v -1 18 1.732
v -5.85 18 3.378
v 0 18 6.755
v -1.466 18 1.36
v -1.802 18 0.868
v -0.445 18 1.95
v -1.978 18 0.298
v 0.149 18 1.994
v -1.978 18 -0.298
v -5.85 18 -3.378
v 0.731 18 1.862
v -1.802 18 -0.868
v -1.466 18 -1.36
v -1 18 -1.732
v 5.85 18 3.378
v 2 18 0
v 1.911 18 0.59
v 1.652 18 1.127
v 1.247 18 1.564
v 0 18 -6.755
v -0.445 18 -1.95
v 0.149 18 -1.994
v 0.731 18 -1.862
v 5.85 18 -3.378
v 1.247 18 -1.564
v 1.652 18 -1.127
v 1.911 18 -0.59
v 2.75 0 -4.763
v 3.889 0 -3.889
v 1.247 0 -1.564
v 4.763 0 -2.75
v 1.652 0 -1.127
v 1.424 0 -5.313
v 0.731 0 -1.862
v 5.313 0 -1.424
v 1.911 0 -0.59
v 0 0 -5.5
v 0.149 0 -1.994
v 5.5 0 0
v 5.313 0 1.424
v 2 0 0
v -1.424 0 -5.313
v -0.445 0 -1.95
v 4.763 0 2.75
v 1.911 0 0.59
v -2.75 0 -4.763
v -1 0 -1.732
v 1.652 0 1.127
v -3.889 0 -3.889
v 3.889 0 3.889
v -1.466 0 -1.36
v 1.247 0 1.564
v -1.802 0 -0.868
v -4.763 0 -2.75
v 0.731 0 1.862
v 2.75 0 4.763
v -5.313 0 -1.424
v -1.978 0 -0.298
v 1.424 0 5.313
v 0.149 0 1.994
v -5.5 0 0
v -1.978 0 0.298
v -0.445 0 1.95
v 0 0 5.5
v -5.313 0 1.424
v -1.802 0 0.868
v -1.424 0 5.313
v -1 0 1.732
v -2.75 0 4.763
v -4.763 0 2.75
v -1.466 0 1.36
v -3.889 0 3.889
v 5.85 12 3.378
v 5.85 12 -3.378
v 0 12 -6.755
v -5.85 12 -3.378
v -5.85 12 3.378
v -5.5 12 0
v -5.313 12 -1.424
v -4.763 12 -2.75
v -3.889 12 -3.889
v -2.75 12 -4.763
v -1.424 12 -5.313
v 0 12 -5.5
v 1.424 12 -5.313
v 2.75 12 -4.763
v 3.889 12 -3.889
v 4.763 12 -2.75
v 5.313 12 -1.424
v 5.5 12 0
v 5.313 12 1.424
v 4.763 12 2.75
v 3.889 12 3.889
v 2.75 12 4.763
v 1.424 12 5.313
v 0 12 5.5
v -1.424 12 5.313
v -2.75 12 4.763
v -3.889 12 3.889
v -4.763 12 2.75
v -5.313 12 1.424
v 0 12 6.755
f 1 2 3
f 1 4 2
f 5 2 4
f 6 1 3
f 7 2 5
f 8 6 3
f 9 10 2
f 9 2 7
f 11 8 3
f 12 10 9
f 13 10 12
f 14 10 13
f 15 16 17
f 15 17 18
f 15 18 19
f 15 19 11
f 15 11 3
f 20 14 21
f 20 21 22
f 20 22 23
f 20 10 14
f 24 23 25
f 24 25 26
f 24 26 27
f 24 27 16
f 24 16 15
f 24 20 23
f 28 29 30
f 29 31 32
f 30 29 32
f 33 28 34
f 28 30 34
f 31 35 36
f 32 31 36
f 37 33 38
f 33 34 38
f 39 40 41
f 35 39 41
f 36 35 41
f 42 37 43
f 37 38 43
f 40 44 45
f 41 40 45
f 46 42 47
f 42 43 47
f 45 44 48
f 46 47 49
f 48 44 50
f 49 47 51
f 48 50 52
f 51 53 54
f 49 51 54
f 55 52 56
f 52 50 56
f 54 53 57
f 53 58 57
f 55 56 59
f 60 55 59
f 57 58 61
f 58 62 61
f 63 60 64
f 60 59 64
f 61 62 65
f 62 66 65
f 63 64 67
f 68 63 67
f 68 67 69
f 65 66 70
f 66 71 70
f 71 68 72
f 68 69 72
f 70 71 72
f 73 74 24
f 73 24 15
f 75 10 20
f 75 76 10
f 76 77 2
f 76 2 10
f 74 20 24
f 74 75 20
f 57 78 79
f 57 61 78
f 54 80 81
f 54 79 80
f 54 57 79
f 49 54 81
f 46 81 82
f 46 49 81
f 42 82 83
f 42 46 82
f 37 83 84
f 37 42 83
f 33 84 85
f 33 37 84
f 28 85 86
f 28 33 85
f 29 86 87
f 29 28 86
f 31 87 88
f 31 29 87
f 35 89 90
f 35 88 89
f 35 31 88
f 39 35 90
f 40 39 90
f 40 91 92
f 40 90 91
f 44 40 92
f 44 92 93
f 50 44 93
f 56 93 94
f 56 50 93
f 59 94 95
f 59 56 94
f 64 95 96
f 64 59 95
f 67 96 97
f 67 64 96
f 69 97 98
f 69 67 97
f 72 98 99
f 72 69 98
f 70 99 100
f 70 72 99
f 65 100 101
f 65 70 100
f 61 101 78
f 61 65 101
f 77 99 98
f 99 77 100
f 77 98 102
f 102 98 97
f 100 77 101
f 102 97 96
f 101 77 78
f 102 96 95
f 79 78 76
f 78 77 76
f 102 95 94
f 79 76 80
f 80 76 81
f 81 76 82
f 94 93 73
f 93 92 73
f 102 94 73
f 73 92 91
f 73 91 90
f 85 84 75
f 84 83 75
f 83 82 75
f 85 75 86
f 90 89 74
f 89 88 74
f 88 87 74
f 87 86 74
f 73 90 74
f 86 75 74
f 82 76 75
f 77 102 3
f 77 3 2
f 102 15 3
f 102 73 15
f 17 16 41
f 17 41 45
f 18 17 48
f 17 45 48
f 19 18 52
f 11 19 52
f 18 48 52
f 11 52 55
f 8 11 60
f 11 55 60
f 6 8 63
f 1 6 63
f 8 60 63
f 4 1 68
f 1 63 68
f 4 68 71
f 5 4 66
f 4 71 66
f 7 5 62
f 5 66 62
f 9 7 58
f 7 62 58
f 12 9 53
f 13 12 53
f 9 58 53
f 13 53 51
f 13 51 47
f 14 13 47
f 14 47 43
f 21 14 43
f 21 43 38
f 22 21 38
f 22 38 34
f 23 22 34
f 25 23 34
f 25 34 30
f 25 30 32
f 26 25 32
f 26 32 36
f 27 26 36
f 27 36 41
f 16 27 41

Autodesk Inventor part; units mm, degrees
ref_plane "XZ Plane" through (0, 0, 0) normal (0, 1, 0) x (-1, 0, 0)
ref_plane "XY Plane" through (0, 0, 0) normal (0, 0, 1) x (1, 0, 0)
sketch "草圖1" plane through (0, 0, 0) normal (0, 1, 0) x (-1, 0, 0)
  circle A0 centre (0, 0) radius 5.5
  dimension "d0" = 11
extrude "擠出1" add sketch "草圖1" along normal blind 12
sketch "草圖2" plane through (0, 12, 0) normal (0, 1, 0) x (1, 0, 0)
  line L0 (5.85, -3.3775) -> (0, -6.755)
  line L1 (0, -6.755) -> (-5.85, -3.3775)
  line L2 (-5.85, -3.3775) -> (-5.85, 3.3775)
  line L3 (-5.85, 3.3775) -> (0, 6.755)
  line L4 (0, 6.755) -> (5.85, 3.3775)
  line L5 (5.85, 3.3775) -> (5.85, -3.3775)
  point P0 (0, 0)
  point P1 (0, 0)
  dimension "d3" = 11.7
extrude "擠出2" add sketch "草圖2" along normal blind 6
sketch "草圖3" plane through (0, 0, 0) normal (0, -1, 0) x (1, 0, 0)
  circle A0 centre (0, 0) radius 2
  dimension "d6" = 4
extrude "擠出3" cut sketch "草圖3" against normal up to surface (18 mm away)
sketch "草圖6" plane through (0, 0, 0) normal (0, -1, 0) x (1, 0, 0)
  circle A0 centre (0, 0) radius 2 projected
  circle A1 centre (0, 0) radius 5.5 projected
  circle A2 centre (0, 0) radius 2 projected
  line L0 (1.0536, 1.7) -> (-1.0536, 1.7)
  dimension "d15" = 1.7
ref_plane "工作平面2" through (-5.5, 0, 0) normal (1, 0, 0) x (0, 1, 0)
ref_plane "工作平面1" through (5.5, 0, 0) normal (1, 0, 0) x (0, 1, 0)
sketch "草圖8" plane through (0, 0, 0) normal (0, -1, 0) x (1, 0, 0)
  arc A0 (-0.7518, 6.0636) -> (-1.1588, 5.9991) centre (0, 0) ccw
  arc A1 (-1.1588, 5.9991) -> (-1.2788, 5.8304) centre (-1.1303, 5.8518) ccw
  arc A2 (-1.2782, 5.5484) -> (-1.2788, 5.8304) centre (-2.2685, 5.6874) ccw
  arc A3 (-2.2271, 5.24) -> (-1.2782, 5.5484) centre (-1.8278, 5.6255) ccw
  arc A4 (-2.3924, 5.4685) -> (-2.2271, 5.24) centre (-1.5077, 5.9346) ccw
  arc A5 (-2.3924, 5.4685) -> (-2.5887, 5.5345) centre (-2.5252, 5.3986) ccw
  arc A6 (-2.5887, 5.5345) -> (-2.9559, 5.3474) centre (0, 0) ccw
  arc A7 (-2.9559, 5.3474) -> (-3.0179, 5.1498) centre (-2.8833, 5.2161) ccw
  arc A8 (-2.9302, 4.8818) -> (-3.0179, 5.1498) centre (-3.915, 4.708) ccw
  arc A9 (-3.7374, 4.2953) -> (-2.9302, 4.8818) centre (-3.4767, 4.7853) ccw
  arc A10 (-3.9652, 4.4616) -> (-3.7374, 4.2953) centre (-3.2678, 5.1782) ccw
  arc A11 (-3.9652, 4.4616) -> (-4.1723, 4.4637) centre (-4.0698, 4.3541) ccw
  arc A12 (-4.1723, 4.4637) -> (-4.4637, 4.1723) centre (0, 0) ccw
  arc A13 (-4.4637, 4.1723) -> (-4.4616, 3.9652) centre (-4.3541, 4.0698) ccw
  arc A14 (-4.2953, 3.7374) -> (-4.4616, 3.9652) centre (-5.1782, 3.2678) ccw
  arc A15 (-4.8818, 2.9302) -> (-4.2953, 3.7374) centre (-4.7853, 3.4767) ccw
  arc A16 (-5.1498, 3.0179) -> (-4.8818, 2.9302) centre (-4.708, 3.915) ccw
  arc A17 (-5.1498, 3.0179) -> (-5.3474, 2.9559) centre (-5.2161, 2.8833) ccw
  arc A18 (-5.3474, 2.9559) -> (-5.5345, 2.5887) centre (0, 0) ccw
  arc A19 (-5.5345, 2.5887) -> (-5.4685, 2.3924) centre (-5.3986, 2.5252) ccw
  arc A20 (-5.24, 2.2271) -> (-5.4685, 2.3924) centre (-5.9346, 1.5077) ccw
  arc A21 (-5.5484, 1.2782) -> (-5.24, 2.2271) centre (-5.6255, 1.8278) ccw
  arc A22 (-5.8304, 1.2788) -> (-5.5484, 1.2782) centre (-5.6874, 2.2685) ccw
  arc A23 (-5.8304, 1.2788) -> (-5.9991, 1.1588) centre (-5.8518, 1.1303) ccw
  arc A24 (-5.9991, 1.1588) -> (-6.0636, 0.7518) centre (0, 0) ccw
  arc A25 (-6.0636, 0.7518) -> (-5.9402, 0.5855) centre (-5.9147, 0.7333) ccw
  arc A26 (-5.6718, 0.4989) -> (-5.9402, 0.5855) centre (-6.11, -0.4) ccw
  arc A27 (-5.6718, -0.4989) -> (-5.6718, 0.4989) centre (-5.915, 0) ccw
  arc A28 (-5.9402, -0.5855) -> (-5.6718, -0.4989) centre (-6.11, 0.4) ccw
  arc A29 (-5.9402, -0.5855) -> (-6.0636, -0.7518) centre (-5.9147, -0.7333) ccw
  arc A30 (-6.0636, -0.7518) -> (-5.9991, -1.1588) centre (0, 0) ccw
  arc A31 (-5.9991, -1.1588) -> (-5.8304, -1.2788) centre (-5.8518, -1.1303) ccw
  arc A32 (-5.5484, -1.2782) -> (-5.8304, -1.2788) centre (-5.6874, -2.2685) ccw
  arc A33 (-5.24, -2.2271) -> (-5.5484, -1.2782) centre (-5.6255, -1.8278) ccw
  arc A34 (-5.4685, -2.3924) -> (-5.24, -2.2271) centre (-5.9346, -1.5077) ccw
  arc A35 (-5.4685, -2.3924) -> (-5.5345, -2.5887) centre (-5.3986, -2.5252) ccw
  arc A36 (-5.5345, -2.5887) -> (-5.3474, -2.9559) centre (0, 0) ccw
  arc A37 (-5.3474, -2.9559) -> (-5.1498, -3.0179) centre (-5.2161, -2.8833) ccw
  arc A38 (-4.8818, -2.9302) -> (-5.1498, -3.0179) centre (-4.708, -3.915) ccw
  arc A39 (-4.2953, -3.7374) -> (-4.8818, -2.9302) centre (-4.7853, -3.4767) ccw
  arc A40 (-4.4616, -3.9652) -> (-4.2953, -3.7374) centre (-5.1782, -3.2678) ccw
  arc A41 (-4.4616, -3.9652) -> (-4.4637, -4.1723) centre (-4.3541, -4.0698) ccw
  arc A42 (-4.4637, -4.1723) -> (-4.1723, -4.4637) centre (0, 0) ccw
  arc A43 (-4.1723, -4.4637) -> (-3.9652, -4.4616) centre (-4.0698, -4.3541) ccw
  arc A44 (-3.7374, -4.2953) -> (-3.9652, -4.4616) centre (-3.2678, -5.1782) ccw
  arc A45 (-2.9302, -4.8818) -> (-3.7374, -4.2953) centre (-3.4767, -4.7853) ccw
  arc A46 (-3.0179, -5.1498) -> (-2.9302, -4.8818) centre (-3.915, -4.708) ccw
  arc A47 (-3.0179, -5.1498) -> (-2.9559, -5.3474) centre (-2.8833, -5.2161) ccw
  arc A48 (-2.9559, -5.3474) -> (-2.5887, -5.5345) centre (0, 0) ccw
  arc A49 (-2.5887, -5.5345) -> (-2.3924, -5.4685) centre (-2.5252, -5.3986) ccw
  arc A50 (-2.2271, -5.24) -> (-2.3924, -5.4685) centre (-1.5077, -5.9346) ccw
  arc A51 (-1.2782, -5.5484) -> (-2.2271, -5.24) centre (-1.8278, -5.6255) ccw
  arc A52 (-1.2788, -5.8304) -> (-1.2782, -5.5484) centre (-2.2685, -5.6874) ccw
  arc A53 (-1.2788, -5.8304) -> (-1.1588, -5.9991) centre (-1.1303, -5.8518) ccw
  arc A54 (-1.1588, -5.9991) -> (-0.7518, -6.0636) centre (0, 0) ccw
  arc A55 (-0.7518, -6.0636) -> (-0.5855, -5.9402) centre (-0.7333, -5.9147) ccw
  arc A56 (-0.4989, -5.6718) -> (-0.5855, -5.9402) centre (0.4, -6.11) ccw
  arc A57 (0.4989, -5.6718) -> (-0.4989, -5.6718) centre (0, -5.915) ccw
  arc A58 (0.5855, -5.9402) -> (0.4989, -5.6718) centre (-0.4, -6.11) ccw
  arc A59 (0.5855, -5.9402) -> (0.7518, -6.0636) centre (0.7333, -5.9147) ccw
  arc A60 (0.7518, -6.0636) -> (1.1588, -5.9991) centre (0, 0) ccw
  arc A61 (1.1588, -5.9991) -> (1.2788, -5.8304) centre (1.1303, -5.8518) ccw
  arc A62 (1.2782, -5.5484) -> (1.2788, -5.8304) centre (2.2685, -5.6874) ccw
  arc A63 (2.2271, -5.24) -> (1.2782, -5.5484) centre (1.8278, -5.6255) ccw
  arc A64 (2.3924, -5.4685) -> (2.2271, -5.24) centre (1.5077, -5.9346) ccw
  arc A65 (2.3924, -5.4685) -> (2.5887, -5.5345) centre (2.5252, -5.3986) ccw
  arc A66 (2.5887, -5.5345) -> (2.9559, -5.3474) centre (0, 0) ccw
  arc A67 (2.9559, -5.3474) -> (3.0179, -5.1498) centre (2.8833, -5.2161) ccw
  arc A68 (2.9302, -4.8818) -> (3.0179, -5.1498) centre (3.915, -4.708) ccw
  arc A69 (3.7374, -4.2953) -> (2.9302, -4.8818) centre (3.4767, -4.7853) ccw
  arc A70 (3.9652, -4.4616) -> (3.7374, -4.2953) centre (3.2678, -5.1782) ccw
  arc A71 (3.9652, -4.4616) -> (4.1723, -4.4637) centre (4.0698, -4.3541) ccw
  arc A72 (4.1723, -4.4637) -> (4.4637, -4.1723) centre (0, 0) ccw
  arc A73 (4.4637, -4.1723) -> (4.4616, -3.9652) centre (4.3541, -4.0698) ccw
  arc A74 (4.2953, -3.7374) -> (4.4616, -3.9652) centre (5.1782, -3.2678) ccw
  arc A75 (4.8818, -2.9302) -> (4.2953, -3.7374) centre (4.7853, -3.4767) ccw
  arc A76 (5.1498, -3.0179) -> (4.8818, -2.9302) centre (4.708, -3.915) ccw
  arc A77 (5.1498, -3.0179) -> (5.3474, -2.9559) centre (5.2161, -2.8833) ccw
  arc A78 (5.3474, -2.9559) -> (5.5345, -2.5887) centre (0, 0) ccw
  arc A79 (5.5345, -2.5887) -> (5.4685, -2.3924) centre (5.3986, -2.5252) ccw
  arc A80 (5.24, -2.2271) -> (5.4685, -2.3924) centre (5.9346, -1.5077) ccw
  arc A81 (5.5484, -1.2782) -> (5.24, -2.2271) centre (5.6255, -1.8278) ccw
  arc A82 (5.8304, -1.2788) -> (5.5484, -1.2782) centre (5.6874, -2.2685) ccw
  arc A83 (5.8304, -1.2788) -> (5.9991, -1.1588) centre (5.8518, -1.1303) ccw
  arc A84 (5.9991, -1.1588) -> (6.0636, -0.7518) centre (0, 0) ccw
  arc A85 (6.0636, -0.7518) -> (5.9402, -0.5855) centre (5.9147, -0.7333) ccw
  arc A86 (5.6718, -0.4989) -> (5.9402, -0.5855) centre (6.11, 0.4) ccw
  arc A87 (5.6718, 0.4989) -> (5.6718, -0.4989) centre (5.915, 0) ccw
  arc A88 (5.9402, 0.5855) -> (5.6718, 0.4989) centre (6.11, -0.4) ccw
  arc A89 (5.9402, 0.5855) -> (6.0636, 0.7518) centre (5.9147, 0.7333) ccw
  arc A90 (6.0636, 0.7518) -> (5.9991, 1.1588) centre (0, 0) ccw
  arc A91 (5.9991, 1.1588) -> (5.8304, 1.2788) centre (5.8518, 1.1303) ccw
  arc A92 (5.5484, 1.2782) -> (5.8304, 1.2788) centre (5.6874, 2.2685) ccw
  arc A93 (5.24, 2.2271) -> (5.5484, 1.2782) centre (5.6255, 1.8278) ccw
  arc A94 (5.4685, 2.3924) -> (5.24, 2.2271) centre (5.9346, 1.5077) ccw
  arc A95 (5.4685, 2.3924) -> (5.5345, 2.5887) centre (5.3986, 2.5252) ccw
  arc A96 (5.5345, 2.5887) -> (5.3474, 2.9559) centre (0, 0) ccw
  arc A97 (5.3474, 2.9559) -> (5.1498, 3.0179) centre (5.2161, 2.8833) ccw
  arc A98 (4.8818, 2.9302) -> (5.1498, 3.0179) centre (4.708, 3.915) ccw
  arc A99 (4.2953, 3.7374) -> (4.8818, 2.9302) centre (4.7853, 3.4767) ccw
  arc A100 (4.4616, 3.9652) -> (4.2953, 3.7374) centre (5.1782, 3.2678) ccw
  arc A101 (4.4616, 3.9652) -> (4.4637, 4.1723) centre (4.3541, 4.0698) ccw
  arc A102 (4.4637, 4.1723) -> (4.1723, 4.4637) centre (0, 0) ccw
  arc A103 (4.1723, 4.4637) -> (3.9652, 4.4616) centre (4.0698, 4.3541) ccw
  arc A104 (3.7374, 4.2953) -> (3.9652, 4.4616) centre (3.2678, 5.1782) ccw
  arc A105 (2.9302, 4.8818) -> (3.7374, 4.2953) centre (3.4767, 4.7853) ccw
  arc A106 (3.0179, 5.1498) -> (2.9302, 4.8818) centre (3.915, 4.708) ccw
  arc A107 (3.0179, 5.1498) -> (2.9559, 5.3474) centre (2.8833, 5.2161) ccw
  arc A108 (2.9559, 5.3474) -> (2.5887, 5.5345) centre (0, 0) ccw
  arc A109 (2.5887, 5.5345) -> (2.3924, 5.4685) centre (2.5252, 5.3986) ccw
  arc A110 (2.2271, 5.24) -> (2.3924, 5.4685) centre (1.5077, 5.9346) ccw
  arc A111 (1.2782, 5.5484) -> (2.2271, 5.24) centre (1.8278, 5.6255) ccw
  arc A112 (1.2788, 5.8304) -> (1.2782, 5.5484) centre (2.2685, 5.6874) ccw
  arc A113 (1.2788, 5.8304) -> (1.1588, 5.9991) centre (1.1303, 5.8518) ccw
  arc A114 (1.1588, 5.9991) -> (0.7518, 6.0636) centre (0, 0) ccw
  arc A115 (0.7518, 6.0636) -> (0.5855, 5.9402) centre (0.7333, 5.9147) ccw
  arc A116 (0.4989, 5.6718) -> (0.5855, 5.9402) centre (-0.4, 6.11) ccw
  arc A117 (-0.4989, 5.6718) -> (0.4989, 5.6718) centre (0, 5.915) ccw
  arc A118 (-0.5855, 5.9402) -> (-0.4989, 5.6718) centre (0.4, 6.11) ccw
  arc A119 (-0.5855, 5.9402) -> (-0.7518, 6.0636) centre (-0.7333, 5.9147) ccw
extrude "擠出7" [suppressed]
sketch "草圖9" plane through (0, 0, 0) normal (0, 1, 0) x (1, 0, 0)
  point P0 (0, 0)
extrude "擠出8" [suppressed]
sketch "草圖10" plane through (0, 0, 0) normal (0, -1, 0) x (1, 0, 0)
  arc A0 (-5.5, 0) -> (-5.5, 0) centre (0, 0) ccw projected
  arc A1 (-5.5, 0) -> (-5.5, 0) centre (0, 0) ccw projected
  circle A2 centre (0, 0) radius 5.5 projected
  arc A3 (-0.7518, 6.0636) -> (-1.1588, 5.9991) centre (0, 0) ccw projected
  arc A4 (-1.1588, 5.9991) -> (-1.2788, 5.8304) centre (-1.1303, 5.8518) ccw projected
  arc A5 (-1.2782, 5.5484) -> (-1.2788, 5.8304) centre (-2.2685, 5.6874) ccw projected
  arc A6 (-2.2271, 5.24) -> (-1.2782, 5.5484) centre (-1.8278, 5.6255) ccw projected
  arc A7 (-2.3924, 5.4685) -> (-2.2271, 5.24) centre (-1.5077, 5.9346) ccw projected
  arc A8 (-2.3924, 5.4685) -> (-2.5887, 5.5345) centre (-2.5252, 5.3986) ccw projected
  arc A9 (-2.5887, 5.5345) -> (-2.9559, 5.3474) centre (0, 0) ccw projected
  arc A10 (-2.9559, 5.3474) -> (-3.0179, 5.1498) centre (-2.8833, 5.2161) ccw projected
  arc A11 (-2.9302, 4.8818) -> (-3.0179, 5.1498) centre (-3.915, 4.708) ccw projected
  arc A12 (-3.7374, 4.2953) -> (-2.9302, 4.8818) centre (-3.4767, 4.7853) ccw projected
  arc A13 (-3.9652, 4.4616) -> (-3.7374, 4.2953) centre (-3.2678, 5.1782) ccw projected
  arc A14 (-3.9652, 4.4616) -> (-4.1723, 4.4637) centre (-4.0698, 4.3541) ccw projected
  arc A15 (-4.1723, 4.4637) -> (-4.4637, 4.1723) centre (0, 0) ccw projected
  arc A16 (-4.4637, 4.1723) -> (-4.4616, 3.9652) centre (-4.3541, 4.0698) ccw projected
  arc A17 (-4.2953, 3.7374) -> (-4.4616, 3.9652) centre (-5.1782, 3.2678) ccw projected
  arc A18 (-4.8818, 2.9302) -> (-4.2953, 3.7374) centre (-4.7853, 3.4767) ccw projected
  arc A19 (-5.1498, 3.0179) -> (-4.8818, 2.9302) centre (-4.708, 3.915) ccw projected
  arc A20 (-5.1498, 3.0179) -> (-5.3474, 2.9559) centre (-5.2161, 2.8833) ccw projected
  arc A21 (-5.3474, 2.9559) -> (-5.5345, 2.5887) centre (0, 0) ccw projected
  arc A22 (-5.5345, 2.5887) -> (-5.4685, 2.3924) centre (-5.3986, 2.5252) ccw projected
  arc A23 (-5.24, 2.2271) -> (-5.4685, 2.3924) centre (-5.9346, 1.5077) ccw projected
  arc A24 (-5.5484, 1.2782) -> (-5.24, 2.2271) centre (-5.6255, 1.8278) ccw projected
  arc A25 (-5.8304, 1.2788) -> (-5.5484, 1.2782) centre (-5.6874, 2.2685) ccw projected
  arc A26 (-5.8304, 1.2788) -> (-5.9991, 1.1588) centre (-5.8518, 1.1303) ccw projected
  arc A27 (-5.9991, 1.1588) -> (-6.0636, 0.7518) centre (0, 0) ccw projected
  arc A28 (-6.0636, 0.7518) -> (-5.9402, 0.5855) centre (-5.9147, 0.7333) ccw projected
  arc A29 (-5.6718, 0.4989) -> (-5.9402, 0.5855) centre (-6.11, -0.4) ccw projected
  arc A30 (-5.6718, -0.4989) -> (-5.6718, 0.4989) centre (-5.915, 0) ccw projected
  arc A31 (-5.9402, -0.5855) -> (-5.6718, -0.4989) centre (-6.11, 0.4) ccw projected
  arc A32 (-5.9402, -0.5855) -> (-6.0636, -0.7518) centre (-5.9147, -0.7333) ccw projected
  arc A33 (-6.0636, -0.7518) -> (-5.9991, -1.1588) centre (0, 0) ccw projected
  arc A34 (-5.9991, -1.1588) -> (-5.8304, -1.2788) centre (-5.8518, -1.1303) ccw projected
  arc A35 (-5.5484, -1.2782) -> (-5.8304, -1.2788) centre (-5.6874, -2.2685) ccw projected
  arc A36 (-5.24, -2.2271) -> (-5.5484, -1.2782) centre (-5.6255, -1.8278) ccw projected
  arc A37 (-5.4685, -2.3924) -> (-5.24, -2.2271) centre (-5.9346, -1.5077) ccw projected
  arc A38 (-5.4685, -2.3924) -> (-5.5345, -2.5887) centre (-5.3986, -2.5252) ccw projected
  arc A39 (-5.5345, -2.5887) -> (-5.3474, -2.9559) centre (0, 0) ccw projected
  arc A40 (-5.3474, -2.9559) -> (-5.1498, -3.0179) centre (-5.2161, -2.8833) ccw projected
  arc A41 (-4.8818, -2.9302) -> (-5.1498, -3.0179) centre (-4.708, -3.915) ccw projected
  arc A42 (-4.2953, -3.7374) -> (-4.8818, -2.9302) centre (-4.7853, -3.4767) ccw projected
  arc A43 (-4.4616, -3.9652) -> (-4.2953, -3.7374) centre (-5.1782, -3.2678) ccw projected
  arc A44 (-4.4616, -3.9652) -> (-4.4637, -4.1723) centre (-4.3541, -4.0698) ccw projected
  arc A45 (-4.4637, -4.1723) -> (-4.1723, -4.4637) centre (0, 0) ccw projected
  arc A46 (-4.1723, -4.4637) -> (-3.9652, -4.4616) centre (-4.0698, -4.3541) ccw projected
  arc A47 (-3.7374, -4.2953) -> (-3.9652, -4.4616) centre (-3.2678, -5.1782) ccw projected
  arc A48 (-2.9302, -4.8818) -> (-3.7374, -4.2953) centre (-3.4767, -4.7853) ccw projected
  arc A49 (-3.0179, -5.1498) -> (-2.9302, -4.8818) centre (-3.915, -4.708) ccw projected
  arc A50 (-3.0179, -5.1498) -> (-2.9559, -5.3474) centre (-2.8833, -5.2161) ccw projected
  arc A51 (-2.9559, -5.3474) -> (-2.5887, -5.5345) centre (0, 0) ccw projected
  arc A52 (-2.5887, -5.5345) -> (-2.3924, -5.4685) centre (-2.5252, -5.3986) ccw projected
  arc A53 (-2.2271, -5.24) -> (-2.3924, -5.4685) centre (-1.5077, -5.9346) ccw projected
  arc A54 (-1.2782, -5.5484) -> (-2.2271, -5.24) centre (-1.8278, -5.6255) ccw projected
  arc A55 (-1.2788, -5.8304) -> (-1.2782, -5.5484) centre (-2.2685, -5.6874) ccw projected
  arc A56 (-1.2788, -5.8304) -> (-1.1588, -5.9991) centre (-1.1303, -5.8518) ccw projected
  arc A57 (-1.1588, -5.9991) -> (-0.7518, -6.0636) centre (0, 0) ccw projected
  arc A58 (-0.7518, -6.0636) -> (-0.5855, -5.9402) centre (-0.7333, -5.9147) ccw projected
  arc A59 (-0.4989, -5.6718) -> (-0.5855, -5.9402) centre (0.4, -6.11) ccw projected
  arc A60 (0.4989, -5.6718) -> (-0.4989, -5.6718) centre (0, -5.915) ccw projected
  arc A61 (0.5855, -5.9402) -> (0.4989, -5.6718) centre (-0.4, -6.11) ccw projected
  arc A62 (0.5855, -5.9402) -> (0.7518, -6.0636) centre (0.7333, -5.9147) ccw projected
  arc A63 (0.7518, -6.0636) -> (1.1588, -5.9991) centre (0, 0) ccw projected
  arc A64 (1.1588, -5.9991) -> (1.2788, -5.8304) centre (1.1303, -5.8518) ccw projected
  arc A65 (1.2782, -5.5484) -> (1.2788, -5.8304) centre (2.2685, -5.6874) ccw projected
  arc A66 (2.2271, -5.24) -> (1.2782, -5.5484) centre (1.8278, -5.6255) ccw projected
  arc A67 (2.3924, -5.4685) -> (2.2271, -5.24) centre (1.5077, -5.9346) ccw projected
  arc A68 (2.3924, -5.4685) -> (2.5887, -5.5345) centre (2.5252, -5.3986) ccw projected
  arc A69 (2.5887, -5.5345) -> (2.9559, -5.3474) centre (0, 0) ccw projected
  arc A70 (2.9559, -5.3474) -> (3.0179, -5.1498) centre (2.8833, -5.2161) ccw projected
  arc A71 (2.9302, -4.8818) -> (3.0179, -5.1498) centre (3.915, -4.708) ccw projected
  arc A72 (3.7374, -4.2953) -> (2.9302, -4.8818) centre (3.4767, -4.7853) ccw projected
  arc A73 (3.9652, -4.4616) -> (3.7374, -4.2953) centre (3.2678, -5.1782) ccw projected
  arc A74 (3.9652, -4.4616) -> (4.1723, -4.4637) centre (4.0698, -4.3541) ccw projected
  arc A75 (4.1723, -4.4637) -> (4.4637, -4.1723) centre (0, 0) ccw projected
  arc A76 (4.4637, -4.1723) -> (4.4616, -3.9652) centre (4.3541, -4.0698) ccw projected
  arc A77 (4.2953, -3.7374) -> (4.4616, -3.9652) centre (5.1782, -3.2678) ccw projected
  arc A78 (4.8818, -2.9302) -> (4.2953, -3.7374) centre (4.7853, -3.4767) ccw projected
  arc A79 (5.1498, -3.0179) -> (4.8818, -2.9302) centre (4.708, -3.915) ccw projected
  arc A80 (5.1498, -3.0179) -> (5.3474, -2.9559) centre (5.2161, -2.8833) ccw projected
  arc A81 (5.3474, -2.9559) -> (5.5345, -2.5887) centre (0, 0) ccw projected
  arc A82 (5.5345, -2.5887) -> (5.4685, -2.3924) centre (5.3986, -2.5252) ccw projected
  arc A83 (5.24, -2.2271) -> (5.4685, -2.3924) centre (5.9346, -1.5077) ccw projected
  arc A84 (5.5484, -1.2782) -> (5.24, -2.2271) centre (5.6255, -1.8278) ccw projected
  arc A85 (5.8304, -1.2788) -> (5.5484, -1.2782) centre (5.6874, -2.2685) ccw projected
  arc A86 (5.8304, -1.2788) -> (5.9991, -1.1588) centre (5.8518, -1.1303) ccw projected
  arc A87 (5.9991, -1.1588) -> (6.0636, -0.7518) centre (0, 0) ccw projected
  arc A88 (6.0636, -0.7518) -> (5.9402, -0.5855) centre (5.9147, -0.7333) ccw projected
  arc A89 (5.6718, -0.4989) -> (5.9402, -0.5855) centre (6.11, 0.4) ccw projected
  arc A90 (5.6718, 0.4989) -> (5.6718, -0.4989) centre (5.915, 0) ccw projected
  arc A91 (5.9402, 0.5855) -> (5.6718, 0.4989) centre (6.11, -0.4) ccw projected
  arc A92 (5.9402, 0.5855) -> (6.0636, 0.7518) centre (5.9147, 0.7333) ccw projected
  arc A93 (6.0636, 0.7518) -> (5.9991, 1.1588) centre (0, 0) ccw projected
  arc A94 (5.9991, 1.1588) -> (5.8304, 1.2788) centre (5.8518, 1.1303) ccw projected
  arc A95 (5.5484, 1.2782) -> (5.8304, 1.2788) centre (5.6874, 2.2685) ccw projected
  arc A96 (5.24, 2.2271) -> (5.5484, 1.2782) centre (5.6255, 1.8278) ccw projected
  arc A97 (5.4685, 2.3924) -> (5.24, 2.2271) centre (5.9346, 1.5077) ccw projected
  arc A98 (5.4685, 2.3924) -> (5.5345, 2.5887) centre (5.3986, 2.5252) ccw projected
  arc A99 (5.5345, 2.5887) -> (5.3474, 2.9559) centre (0, 0) ccw projected
  arc A100 (5.3474, 2.9559) -> (5.1498, 3.0179) centre (5.2161, 2.8833) ccw projected
  arc A101 (4.8818, 2.9302) -> (5.1498, 3.0179) centre (4.708, 3.915) ccw projected
  arc A102 (4.2953, 3.7374) -> (4.8818, 2.9302) centre (4.7853, 3.4767) ccw projected
  arc A103 (4.4616, 3.9652) -> (4.2953, 3.7374) centre (5.1782, 3.2678) ccw projected
  arc A104 (4.4616, 3.9652) -> (4.4637, 4.1723) centre (4.3541, 4.0698) ccw projected
  arc A105 (4.4637, 4.1723) -> (4.1723, 4.4637) centre (0, 0) ccw projected
  arc A106 (4.1723, 4.4637) -> (3.9652, 4.4616) centre (4.0698, 4.3541) ccw projected
  arc A107 (3.7374, 4.2953) -> (3.9652, 4.4616) centre (3.2678, 5.1782) ccw projected
  arc A108 (2.9302, 4.8818) -> (3.7374, 4.2953) centre (3.4767, 4.7853) ccw projected
  arc A109 (3.0179, 5.1498) -> (2.9302, 4.8818) centre (3.915, 4.708) ccw projected
  arc A110 (3.0179, 5.1498) -> (2.9559, 5.3474) centre (2.8833, 5.2161) ccw projected
  arc A111 (2.9559, 5.3474) -> (2.5887, 5.5345) centre (0, 0) ccw projected
  arc A112 (2.5887, 5.5345) -> (2.3924, 5.4685) centre (2.5252, 5.3986) ccw projected
  arc A113 (2.2271, 5.24) -> (2.3924, 5.4685) centre (1.5077, 5.9346) ccw projected
  arc A114 (1.2782, 5.5484) -> (2.2271, 5.24) centre (1.8278, 5.6255) ccw projected
  arc A115 (1.2788, 5.8304) -> (1.2782, 5.5484) centre (2.2685, 5.6874) ccw projected
  arc A116 (1.2788, 5.8304) -> (1.1588, 5.9991) centre (1.1303, 5.8518) ccw projected
  arc A117 (1.1588, 5.9991) -> (0.7518, 6.0636) centre (0, 0) ccw projected
  arc A118 (0.7518, 6.0636) -> (0.5855, 5.9402) centre (0.7333, 5.9147) ccw projected
  arc A119 (0.4989, 5.6718) -> (0.5855, 5.9402) centre (-0.4, 6.11) ccw projected
  arc A120 (-0.4989, 5.6718) -> (0.4989, 5.6718) centre (0, 5.915) ccw projected
  arc A121 (-0.5855, 5.9402) -> (-0.4989, 5.6718) centre (0.4, 6.11) ccw projected
  arc A122 (-0.5855, 5.9402) -> (-0.7518, 6.0636) centre (-0.7333, 5.9147) ccw projected
  point P0 (4.6491, -2.9387)
  point P1 (4.2315, -3.5134)
  point P2 (1.3583, 5.3296)
  point P3 (2.0338, 5.1101)
  point P4 (-5.4885, -0.3552)
  point P5 (-5.4885, 0.3552)
  point P6 (-2.0338, 5.1101)
  point P7 (-1.3583, 5.3296)
  point P8 (2.9387, 4.6491)
  point P9 (3.5134, 4.2315)
  point P10 (5.1101, 2.0338)
  point P11 (5.3296, 1.3583)
  point P12 (5.3296, -1.3583)
  point P13 (5.1101, -2.0338)
  point P14 (2.0338, -5.1101)
  point P15 (1.3583, -5.3296)
  point P16 (-2.9387, -4.6491)
  point P17 (-3.5134, -4.2315)
  point P18 (-5.1101, -2.0338)
  point P19 (-5.3296, -1.3583)
  point P20 (-4.6491, 2.9387)
  point P21 (-4.2315, 3.5134)
  point P22 (0.3552, -5.4885)
  point P23 (-0.3552, -5.4885)
  point P24 (-0.3552, 5.4885)
  point P25 (0.3552, 5.4885)
  point P26 (4.2315, 3.5134)
  point P27 (4.6491, 2.9387)
  point P28 (5.4885, 0.3552)
  point P29 (5.4885, -0.3552)
  point P30 (3.5134, -4.2315)
  point P31 (2.9387, -4.6491)
  point P32 (-1.3583, -5.3296)
  point P33 (-2.0338, -5.1101)
  point P34 (-4.2315, -3.5134)
  point P35 (-4.6491, -2.9387)
  point P36 (-5.3296, 1.3583)
  point P37 (-5.1101, 2.0338)
  point P38 (-3.5134, 4.2315)
  point P39 (-2.9387, 4.6491)
  point P40 (0.3552, 5.4885)
  point P41 (-0.3552, 5.4885)
  point P42 (0.3552, 5.4885)
  point P43 (-0.3552, 5.4885)
extrude "擠出9" [suppressed]
sketch "草圖11" plane through (0, 1, 0) normal (0, 1, 0) x (1, 0, 0)
  circle A0 centre (0, 0) radius 5.5 projected
  circle A1 centre (0, 0) radius 6.5
  arc A2 (-4.2315, 3.5134) -> (-4.6491, 2.9387) centre (0, 0) ccw projected
  point P0 (5.4885, -0.3552)
  point P1 (5.4885, 0.3552)
  dimension "d26" = 13
extrude "擠出10" [suppressed]
sketch "草圖5" plane through (0, 0, 0) normal (1, 0, 0) x (0, 1, 0)
  circle A0 centre (-2, 0) radius 1.475
  line L0 (0, 21.2872) -> (0, -21.2872) projected
  line L1 (1, -6.5) -> (1, 6.5) projected
  point P0 (0, 0)
  dimension "d32" = 3
  dimension "d33" = 2.95
extrude "擠出5" [suppressed]
sketch "草圖7" plane through (-5.5, 0, 0) normal (1, 0, 0) x (0, 1, 0)
  circle A0 centre (-2, 0) radius 1.525
  point P0 (0, 0)
  point P1 (-2, 0)
  dimension "d17" = 3.05
extrude "擠出6" [suppressed]
mirror "鏡射1" [suppressed]
sketch "草圖12" plane through (0, 18, 0) normal (0, 1, 0) x (1, 0, 0)
  circle A0 centre (0, 0) radius 2 projected
extrude "擠出11" [suppressed]
sketch "草圖13" plane through (0, -5, 0) normal (0, -1, 0) x (1, 0, 0)
  circle A0 centre (0, 0) radius 2.125
  dimension "d38" = 4.25
extrude "擠出12" [suppressed]
properties part number "Coupling"
